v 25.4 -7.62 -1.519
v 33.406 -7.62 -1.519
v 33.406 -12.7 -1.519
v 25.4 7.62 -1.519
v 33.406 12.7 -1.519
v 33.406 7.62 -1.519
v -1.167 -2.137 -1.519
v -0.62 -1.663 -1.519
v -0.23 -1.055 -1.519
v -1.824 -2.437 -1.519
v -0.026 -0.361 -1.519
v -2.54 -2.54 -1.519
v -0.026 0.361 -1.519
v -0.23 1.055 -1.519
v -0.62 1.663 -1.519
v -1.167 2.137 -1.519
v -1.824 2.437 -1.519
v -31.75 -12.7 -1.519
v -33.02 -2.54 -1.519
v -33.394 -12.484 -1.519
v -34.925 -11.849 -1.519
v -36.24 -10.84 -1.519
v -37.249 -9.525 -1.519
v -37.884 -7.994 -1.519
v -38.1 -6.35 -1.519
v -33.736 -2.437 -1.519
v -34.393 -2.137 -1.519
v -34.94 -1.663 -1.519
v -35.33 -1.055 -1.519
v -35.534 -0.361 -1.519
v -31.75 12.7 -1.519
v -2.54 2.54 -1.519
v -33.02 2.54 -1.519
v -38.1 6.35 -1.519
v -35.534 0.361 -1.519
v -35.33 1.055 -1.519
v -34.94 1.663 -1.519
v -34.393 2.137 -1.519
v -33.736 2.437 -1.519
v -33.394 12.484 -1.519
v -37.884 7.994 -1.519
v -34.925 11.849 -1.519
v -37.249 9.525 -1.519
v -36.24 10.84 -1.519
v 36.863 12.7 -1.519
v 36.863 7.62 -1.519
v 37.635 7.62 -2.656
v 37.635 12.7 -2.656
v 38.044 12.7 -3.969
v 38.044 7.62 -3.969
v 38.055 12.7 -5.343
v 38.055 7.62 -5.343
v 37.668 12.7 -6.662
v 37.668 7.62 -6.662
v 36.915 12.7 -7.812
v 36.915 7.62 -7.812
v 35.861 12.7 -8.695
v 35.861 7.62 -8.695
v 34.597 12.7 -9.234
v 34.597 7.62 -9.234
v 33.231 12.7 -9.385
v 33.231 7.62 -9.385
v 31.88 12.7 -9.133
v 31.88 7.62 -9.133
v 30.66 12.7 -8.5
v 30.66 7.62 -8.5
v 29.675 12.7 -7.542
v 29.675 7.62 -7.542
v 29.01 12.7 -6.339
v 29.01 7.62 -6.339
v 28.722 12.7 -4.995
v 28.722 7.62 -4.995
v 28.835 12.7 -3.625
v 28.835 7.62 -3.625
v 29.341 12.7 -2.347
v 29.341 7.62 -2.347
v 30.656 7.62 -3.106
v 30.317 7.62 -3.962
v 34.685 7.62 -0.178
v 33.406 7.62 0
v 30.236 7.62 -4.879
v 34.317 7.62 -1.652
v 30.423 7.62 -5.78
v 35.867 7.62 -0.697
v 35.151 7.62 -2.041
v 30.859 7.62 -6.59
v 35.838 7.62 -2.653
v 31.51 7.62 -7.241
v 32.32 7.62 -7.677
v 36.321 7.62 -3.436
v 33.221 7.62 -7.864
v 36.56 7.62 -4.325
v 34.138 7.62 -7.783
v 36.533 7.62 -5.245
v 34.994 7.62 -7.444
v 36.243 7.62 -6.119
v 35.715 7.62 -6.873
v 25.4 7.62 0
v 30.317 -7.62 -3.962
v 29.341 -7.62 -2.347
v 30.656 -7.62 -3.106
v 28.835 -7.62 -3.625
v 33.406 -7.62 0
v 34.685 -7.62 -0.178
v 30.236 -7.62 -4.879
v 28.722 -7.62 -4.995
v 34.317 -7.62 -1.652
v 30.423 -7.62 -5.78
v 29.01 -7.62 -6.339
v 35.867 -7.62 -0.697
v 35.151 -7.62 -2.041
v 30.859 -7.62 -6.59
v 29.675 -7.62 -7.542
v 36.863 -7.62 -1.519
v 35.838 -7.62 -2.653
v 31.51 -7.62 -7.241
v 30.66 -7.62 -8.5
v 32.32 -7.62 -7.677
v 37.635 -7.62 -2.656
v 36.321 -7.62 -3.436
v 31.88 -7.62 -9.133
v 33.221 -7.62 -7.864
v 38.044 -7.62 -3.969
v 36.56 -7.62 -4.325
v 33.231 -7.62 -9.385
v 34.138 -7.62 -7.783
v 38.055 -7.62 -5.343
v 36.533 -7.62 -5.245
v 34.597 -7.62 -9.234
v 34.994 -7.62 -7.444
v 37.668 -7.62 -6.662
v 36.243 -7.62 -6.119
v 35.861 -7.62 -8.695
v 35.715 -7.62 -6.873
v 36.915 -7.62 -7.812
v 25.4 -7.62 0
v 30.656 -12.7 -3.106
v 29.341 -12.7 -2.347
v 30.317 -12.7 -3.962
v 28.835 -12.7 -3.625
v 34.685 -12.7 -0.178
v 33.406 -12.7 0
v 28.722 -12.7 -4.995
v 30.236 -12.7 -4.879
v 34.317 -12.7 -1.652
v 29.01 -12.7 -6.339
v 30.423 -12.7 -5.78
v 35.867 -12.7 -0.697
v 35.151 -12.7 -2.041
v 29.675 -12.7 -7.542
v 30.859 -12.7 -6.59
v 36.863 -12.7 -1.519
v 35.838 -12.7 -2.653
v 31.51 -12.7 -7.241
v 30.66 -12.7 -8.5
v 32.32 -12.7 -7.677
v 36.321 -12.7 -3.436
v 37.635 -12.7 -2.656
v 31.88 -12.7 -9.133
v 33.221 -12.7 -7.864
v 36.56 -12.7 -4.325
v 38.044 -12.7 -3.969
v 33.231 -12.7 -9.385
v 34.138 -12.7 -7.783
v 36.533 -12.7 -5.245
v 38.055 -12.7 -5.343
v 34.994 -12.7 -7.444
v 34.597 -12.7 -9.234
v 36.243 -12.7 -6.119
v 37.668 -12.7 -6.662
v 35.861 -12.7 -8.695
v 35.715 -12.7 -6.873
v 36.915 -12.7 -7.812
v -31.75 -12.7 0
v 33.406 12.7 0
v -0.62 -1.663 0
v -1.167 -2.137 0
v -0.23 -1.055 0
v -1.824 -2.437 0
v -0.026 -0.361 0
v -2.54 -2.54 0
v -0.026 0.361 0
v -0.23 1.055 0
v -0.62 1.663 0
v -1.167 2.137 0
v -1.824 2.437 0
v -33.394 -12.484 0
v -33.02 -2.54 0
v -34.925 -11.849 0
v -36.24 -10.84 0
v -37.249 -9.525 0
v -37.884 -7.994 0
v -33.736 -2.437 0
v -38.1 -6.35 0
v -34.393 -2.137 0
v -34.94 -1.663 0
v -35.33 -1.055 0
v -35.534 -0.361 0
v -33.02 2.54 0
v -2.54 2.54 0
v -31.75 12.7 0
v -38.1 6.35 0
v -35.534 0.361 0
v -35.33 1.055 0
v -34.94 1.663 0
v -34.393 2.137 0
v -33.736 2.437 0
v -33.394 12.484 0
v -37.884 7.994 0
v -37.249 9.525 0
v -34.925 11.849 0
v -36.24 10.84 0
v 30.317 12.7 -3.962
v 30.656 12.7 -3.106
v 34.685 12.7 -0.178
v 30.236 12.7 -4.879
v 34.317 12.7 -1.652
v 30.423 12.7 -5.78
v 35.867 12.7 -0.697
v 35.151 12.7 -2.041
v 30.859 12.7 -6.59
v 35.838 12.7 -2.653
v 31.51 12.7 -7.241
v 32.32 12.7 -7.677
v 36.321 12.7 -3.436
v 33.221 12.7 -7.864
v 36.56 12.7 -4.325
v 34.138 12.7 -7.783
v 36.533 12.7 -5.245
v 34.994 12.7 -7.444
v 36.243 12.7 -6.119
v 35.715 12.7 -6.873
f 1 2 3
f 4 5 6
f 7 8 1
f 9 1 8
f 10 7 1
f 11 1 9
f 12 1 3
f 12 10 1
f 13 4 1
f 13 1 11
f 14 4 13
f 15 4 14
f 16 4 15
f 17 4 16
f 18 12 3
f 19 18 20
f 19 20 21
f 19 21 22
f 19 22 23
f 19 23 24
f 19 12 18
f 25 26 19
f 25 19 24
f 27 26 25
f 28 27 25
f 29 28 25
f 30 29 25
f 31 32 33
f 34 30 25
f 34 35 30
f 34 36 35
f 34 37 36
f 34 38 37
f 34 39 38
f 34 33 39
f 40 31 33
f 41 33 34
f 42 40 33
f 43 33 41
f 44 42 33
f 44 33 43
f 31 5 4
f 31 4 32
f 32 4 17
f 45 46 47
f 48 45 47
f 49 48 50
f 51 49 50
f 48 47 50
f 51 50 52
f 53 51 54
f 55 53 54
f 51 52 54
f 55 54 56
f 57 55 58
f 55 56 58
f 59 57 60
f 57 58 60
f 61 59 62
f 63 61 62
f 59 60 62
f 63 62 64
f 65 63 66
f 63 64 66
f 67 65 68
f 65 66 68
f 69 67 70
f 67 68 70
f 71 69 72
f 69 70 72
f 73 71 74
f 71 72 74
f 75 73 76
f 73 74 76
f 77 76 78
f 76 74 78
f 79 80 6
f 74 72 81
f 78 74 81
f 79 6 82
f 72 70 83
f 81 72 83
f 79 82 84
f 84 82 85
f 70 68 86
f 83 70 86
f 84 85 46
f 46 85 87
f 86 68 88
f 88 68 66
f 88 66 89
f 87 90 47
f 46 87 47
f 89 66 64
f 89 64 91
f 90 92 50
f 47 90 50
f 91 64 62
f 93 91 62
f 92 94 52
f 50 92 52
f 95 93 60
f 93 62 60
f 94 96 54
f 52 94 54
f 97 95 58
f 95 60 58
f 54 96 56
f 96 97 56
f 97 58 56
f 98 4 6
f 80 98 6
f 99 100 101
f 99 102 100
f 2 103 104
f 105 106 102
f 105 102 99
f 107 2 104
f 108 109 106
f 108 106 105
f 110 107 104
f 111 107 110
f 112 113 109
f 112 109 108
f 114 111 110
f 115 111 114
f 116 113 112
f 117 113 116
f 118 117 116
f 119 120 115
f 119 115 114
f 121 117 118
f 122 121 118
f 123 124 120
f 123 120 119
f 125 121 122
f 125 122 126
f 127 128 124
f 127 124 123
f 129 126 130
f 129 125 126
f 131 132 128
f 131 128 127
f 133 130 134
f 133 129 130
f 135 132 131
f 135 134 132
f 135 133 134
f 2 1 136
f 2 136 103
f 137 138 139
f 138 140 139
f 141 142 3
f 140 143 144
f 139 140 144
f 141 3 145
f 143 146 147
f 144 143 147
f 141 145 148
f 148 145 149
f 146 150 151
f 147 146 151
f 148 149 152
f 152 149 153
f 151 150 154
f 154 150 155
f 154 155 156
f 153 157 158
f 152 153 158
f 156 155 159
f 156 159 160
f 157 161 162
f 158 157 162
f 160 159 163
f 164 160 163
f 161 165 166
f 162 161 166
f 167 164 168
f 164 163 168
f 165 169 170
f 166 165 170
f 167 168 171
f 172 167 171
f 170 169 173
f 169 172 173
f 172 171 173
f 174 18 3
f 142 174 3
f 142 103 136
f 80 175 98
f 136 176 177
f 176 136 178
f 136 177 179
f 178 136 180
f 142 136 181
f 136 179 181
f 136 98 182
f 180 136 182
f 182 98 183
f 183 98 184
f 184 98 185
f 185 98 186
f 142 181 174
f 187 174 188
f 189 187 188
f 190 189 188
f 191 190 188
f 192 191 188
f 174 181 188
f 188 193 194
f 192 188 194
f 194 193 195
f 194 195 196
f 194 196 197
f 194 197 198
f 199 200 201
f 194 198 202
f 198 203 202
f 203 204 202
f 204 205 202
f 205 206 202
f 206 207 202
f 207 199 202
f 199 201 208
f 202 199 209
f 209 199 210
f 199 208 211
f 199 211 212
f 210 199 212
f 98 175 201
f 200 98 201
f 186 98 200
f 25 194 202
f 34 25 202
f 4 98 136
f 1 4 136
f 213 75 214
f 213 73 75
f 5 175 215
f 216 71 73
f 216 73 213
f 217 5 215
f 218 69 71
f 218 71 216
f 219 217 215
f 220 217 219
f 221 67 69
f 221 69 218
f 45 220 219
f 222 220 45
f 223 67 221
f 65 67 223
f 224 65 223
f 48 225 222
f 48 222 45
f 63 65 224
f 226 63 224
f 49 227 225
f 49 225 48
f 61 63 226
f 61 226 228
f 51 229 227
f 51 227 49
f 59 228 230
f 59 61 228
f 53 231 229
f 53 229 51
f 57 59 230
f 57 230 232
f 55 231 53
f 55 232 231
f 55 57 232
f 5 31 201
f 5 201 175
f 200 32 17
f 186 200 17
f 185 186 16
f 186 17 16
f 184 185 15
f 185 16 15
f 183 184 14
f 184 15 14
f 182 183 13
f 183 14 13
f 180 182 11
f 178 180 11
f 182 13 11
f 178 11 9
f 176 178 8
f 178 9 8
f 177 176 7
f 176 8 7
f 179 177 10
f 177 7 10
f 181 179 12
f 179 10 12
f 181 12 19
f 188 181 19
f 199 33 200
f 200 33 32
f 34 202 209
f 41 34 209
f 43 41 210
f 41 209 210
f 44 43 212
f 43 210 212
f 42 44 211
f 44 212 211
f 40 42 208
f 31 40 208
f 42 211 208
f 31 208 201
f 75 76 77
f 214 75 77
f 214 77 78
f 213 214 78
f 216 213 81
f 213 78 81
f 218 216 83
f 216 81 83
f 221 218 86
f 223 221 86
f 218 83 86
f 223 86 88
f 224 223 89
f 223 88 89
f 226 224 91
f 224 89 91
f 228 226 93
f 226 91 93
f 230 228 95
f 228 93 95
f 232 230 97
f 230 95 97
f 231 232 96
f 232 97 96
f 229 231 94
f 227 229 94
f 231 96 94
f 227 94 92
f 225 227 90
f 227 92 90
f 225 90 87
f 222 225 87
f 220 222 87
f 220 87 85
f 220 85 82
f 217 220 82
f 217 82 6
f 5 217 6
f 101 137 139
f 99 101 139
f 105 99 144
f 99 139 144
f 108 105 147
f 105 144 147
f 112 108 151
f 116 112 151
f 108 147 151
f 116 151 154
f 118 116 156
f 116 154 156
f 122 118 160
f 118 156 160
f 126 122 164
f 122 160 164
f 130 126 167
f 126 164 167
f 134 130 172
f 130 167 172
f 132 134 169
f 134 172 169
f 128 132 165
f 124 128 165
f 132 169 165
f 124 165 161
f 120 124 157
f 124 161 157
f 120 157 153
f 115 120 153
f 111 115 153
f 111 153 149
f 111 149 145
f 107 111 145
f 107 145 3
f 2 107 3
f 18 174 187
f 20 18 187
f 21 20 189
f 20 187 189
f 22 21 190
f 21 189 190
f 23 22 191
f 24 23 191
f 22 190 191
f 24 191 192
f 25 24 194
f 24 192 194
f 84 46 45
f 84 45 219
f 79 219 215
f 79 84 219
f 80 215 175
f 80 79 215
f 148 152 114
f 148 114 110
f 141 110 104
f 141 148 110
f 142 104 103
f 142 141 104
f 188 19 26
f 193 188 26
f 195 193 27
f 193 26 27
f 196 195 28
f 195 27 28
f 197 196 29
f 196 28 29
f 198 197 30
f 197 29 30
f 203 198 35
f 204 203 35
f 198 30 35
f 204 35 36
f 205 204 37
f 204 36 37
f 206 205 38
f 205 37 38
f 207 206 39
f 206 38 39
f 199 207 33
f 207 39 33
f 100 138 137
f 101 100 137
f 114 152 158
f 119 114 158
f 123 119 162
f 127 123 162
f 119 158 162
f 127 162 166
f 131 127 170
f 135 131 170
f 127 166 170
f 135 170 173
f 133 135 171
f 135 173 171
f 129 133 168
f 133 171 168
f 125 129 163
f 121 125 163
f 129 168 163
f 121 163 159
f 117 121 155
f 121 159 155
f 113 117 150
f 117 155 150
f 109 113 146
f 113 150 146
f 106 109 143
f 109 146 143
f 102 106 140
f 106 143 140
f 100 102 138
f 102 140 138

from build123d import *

# Parameters (mm, degrees)
BASE_FLANGE1_DEPTH      = 1.51892
HEM1_START              = -12.7
HEM1_DEPTH              = 25.4
HEM1_2_DEPTH            = 5.08
HEM1_START_2            = 7.62
HEM1_3_DEPTH            = 5.08
CUT_EXTRUDE1_DEPTH      = 42.243563617
CUT_EXTRUDE1_DEPTH_BACK = 42.243563617


# Read off the part's stored shape, not the designer's step: Hem1
# Sheet-metal steps are written as plain solids
with BuildPart() as part:
    # Sketch1 → Base-Flange1 (new body)
    with BuildSketch(Plane.XY):
        with BuildLine():
            Line((38.1, -7.62), (38.1, -12.7))
            Line((38.1, -12.7), (-31.75, -12.7))
            ThreePointArc((-31.75, -12.7), (-36.240128061, -10.840128061), (-38.1, -6.35))
            Line((-38.1, -6.35), (-38.1, 6.35))
            ThreePointArc((-38.1, 6.35), (-36.240128061, 10.840128061), (-31.75, 12.7))
            Line((-31.75, 12.7), (38.1, 12.7))
            Line((38.1, 12.7), (38.1, 7.62))
            Line((38.1, 7.62), (25.4, 7.62))
            Line((25.4, 7.62), (25.4, -7.62))
            Line((25.4, -7.62), (38.1, -7.62))
        make_face()
    extrude(amount=-BASE_FLANGE1_DEPTH)

    # Hem1 outline → Hem1 (cut)
    with BuildSketch(Plane(origin=(0, 0, 0), x_dir=(1, 0, 0), z_dir=(0, 1, 0)).offset(HEM1_START)):
        with BuildLine():
            Line((38.1, 1.51892), (36.863284068, 1.51892))
            ThreePointArc((36.863284068, 1.51892), (35.294159576, 0.396474191), (33.40608, 0))
            Line((33.40608, 0), (38.1, 0))
            Line((38.1, 0), (38.1, 1.51892))
        make_face()
    extrude(amount=HEM1_DEPTH, mode=Mode.SUBTRACT)

    # Hem1 2 outline → Hem1 2 (add)
    with BuildSketch(Plane(origin=(0, 0, 0), x_dir=(1, 0, 0), z_dir=(0, 1, 0)).offset(HEM1_START)):
        with BuildLine():
            Line((29.341026037, 2.34696), (30.656449343, 3.10642))
            ThreePointArc((30.656449343, 3.10642), (34.99358, 7.443550657), (33.40608, 1.51892))
            Line((33.40608, 1.51892), (36.863284068, 1.51892))
            ThreePointArc((36.863284068, 1.51892), (33.919678028, 9.359657029), (29.341026037, 2.34696))
        make_face()
    extrude(amount=HEM1_2_DEPTH)

    # Hem1 3 outline → Hem1 3 (add)
    with BuildSketch(Plane(origin=(0, 0, 0), x_dir=(1, 0, 0), z_dir=(0, 1, 0)).offset(HEM1_START_2)):
        with BuildLine():
            Line((29.341026037, 2.34696), (30.656449343, 3.10642))
            ThreePointArc((30.656449343, 3.10642), (34.99358, 7.443550657), (33.40608, 1.51892))
            Line((33.40608, 1.51892), (36.863284068, 1.51892))
            ThreePointArc((36.863284068, 1.51892), (33.919678028, 9.359657029), (29.341026037, 2.34696))
        make_face()
    extrude(amount=HEM1_3_DEPTH)

    # Sketch8 → Cut-Extrude1 (cut, two sides: drawn at the far end of the back side and taken through both)
    with BuildSketch(Plane.XY.offset(-CUT_EXTRUDE1_DEPTH_BACK)):
        with BuildLine():
            Line((-33.02, 2.54), (-2.54, 2.54))
            ThreePointArc((-2.54, 2.54), (0, 0), (-2.54, -2.54))
            Line((-2.54, -2.54), (-33.02, -2.54))
            ThreePointArc((-33.02, -2.54), (-35.56, 0), (-33.02, 2.54))
        make_face()
    extrude(amount=CUT_EXTRUDE1_DEPTH + CUT_EXTRUDE1_DEPTH_BACK, mode=Mode.SUBTRACT)


solid = part.part
